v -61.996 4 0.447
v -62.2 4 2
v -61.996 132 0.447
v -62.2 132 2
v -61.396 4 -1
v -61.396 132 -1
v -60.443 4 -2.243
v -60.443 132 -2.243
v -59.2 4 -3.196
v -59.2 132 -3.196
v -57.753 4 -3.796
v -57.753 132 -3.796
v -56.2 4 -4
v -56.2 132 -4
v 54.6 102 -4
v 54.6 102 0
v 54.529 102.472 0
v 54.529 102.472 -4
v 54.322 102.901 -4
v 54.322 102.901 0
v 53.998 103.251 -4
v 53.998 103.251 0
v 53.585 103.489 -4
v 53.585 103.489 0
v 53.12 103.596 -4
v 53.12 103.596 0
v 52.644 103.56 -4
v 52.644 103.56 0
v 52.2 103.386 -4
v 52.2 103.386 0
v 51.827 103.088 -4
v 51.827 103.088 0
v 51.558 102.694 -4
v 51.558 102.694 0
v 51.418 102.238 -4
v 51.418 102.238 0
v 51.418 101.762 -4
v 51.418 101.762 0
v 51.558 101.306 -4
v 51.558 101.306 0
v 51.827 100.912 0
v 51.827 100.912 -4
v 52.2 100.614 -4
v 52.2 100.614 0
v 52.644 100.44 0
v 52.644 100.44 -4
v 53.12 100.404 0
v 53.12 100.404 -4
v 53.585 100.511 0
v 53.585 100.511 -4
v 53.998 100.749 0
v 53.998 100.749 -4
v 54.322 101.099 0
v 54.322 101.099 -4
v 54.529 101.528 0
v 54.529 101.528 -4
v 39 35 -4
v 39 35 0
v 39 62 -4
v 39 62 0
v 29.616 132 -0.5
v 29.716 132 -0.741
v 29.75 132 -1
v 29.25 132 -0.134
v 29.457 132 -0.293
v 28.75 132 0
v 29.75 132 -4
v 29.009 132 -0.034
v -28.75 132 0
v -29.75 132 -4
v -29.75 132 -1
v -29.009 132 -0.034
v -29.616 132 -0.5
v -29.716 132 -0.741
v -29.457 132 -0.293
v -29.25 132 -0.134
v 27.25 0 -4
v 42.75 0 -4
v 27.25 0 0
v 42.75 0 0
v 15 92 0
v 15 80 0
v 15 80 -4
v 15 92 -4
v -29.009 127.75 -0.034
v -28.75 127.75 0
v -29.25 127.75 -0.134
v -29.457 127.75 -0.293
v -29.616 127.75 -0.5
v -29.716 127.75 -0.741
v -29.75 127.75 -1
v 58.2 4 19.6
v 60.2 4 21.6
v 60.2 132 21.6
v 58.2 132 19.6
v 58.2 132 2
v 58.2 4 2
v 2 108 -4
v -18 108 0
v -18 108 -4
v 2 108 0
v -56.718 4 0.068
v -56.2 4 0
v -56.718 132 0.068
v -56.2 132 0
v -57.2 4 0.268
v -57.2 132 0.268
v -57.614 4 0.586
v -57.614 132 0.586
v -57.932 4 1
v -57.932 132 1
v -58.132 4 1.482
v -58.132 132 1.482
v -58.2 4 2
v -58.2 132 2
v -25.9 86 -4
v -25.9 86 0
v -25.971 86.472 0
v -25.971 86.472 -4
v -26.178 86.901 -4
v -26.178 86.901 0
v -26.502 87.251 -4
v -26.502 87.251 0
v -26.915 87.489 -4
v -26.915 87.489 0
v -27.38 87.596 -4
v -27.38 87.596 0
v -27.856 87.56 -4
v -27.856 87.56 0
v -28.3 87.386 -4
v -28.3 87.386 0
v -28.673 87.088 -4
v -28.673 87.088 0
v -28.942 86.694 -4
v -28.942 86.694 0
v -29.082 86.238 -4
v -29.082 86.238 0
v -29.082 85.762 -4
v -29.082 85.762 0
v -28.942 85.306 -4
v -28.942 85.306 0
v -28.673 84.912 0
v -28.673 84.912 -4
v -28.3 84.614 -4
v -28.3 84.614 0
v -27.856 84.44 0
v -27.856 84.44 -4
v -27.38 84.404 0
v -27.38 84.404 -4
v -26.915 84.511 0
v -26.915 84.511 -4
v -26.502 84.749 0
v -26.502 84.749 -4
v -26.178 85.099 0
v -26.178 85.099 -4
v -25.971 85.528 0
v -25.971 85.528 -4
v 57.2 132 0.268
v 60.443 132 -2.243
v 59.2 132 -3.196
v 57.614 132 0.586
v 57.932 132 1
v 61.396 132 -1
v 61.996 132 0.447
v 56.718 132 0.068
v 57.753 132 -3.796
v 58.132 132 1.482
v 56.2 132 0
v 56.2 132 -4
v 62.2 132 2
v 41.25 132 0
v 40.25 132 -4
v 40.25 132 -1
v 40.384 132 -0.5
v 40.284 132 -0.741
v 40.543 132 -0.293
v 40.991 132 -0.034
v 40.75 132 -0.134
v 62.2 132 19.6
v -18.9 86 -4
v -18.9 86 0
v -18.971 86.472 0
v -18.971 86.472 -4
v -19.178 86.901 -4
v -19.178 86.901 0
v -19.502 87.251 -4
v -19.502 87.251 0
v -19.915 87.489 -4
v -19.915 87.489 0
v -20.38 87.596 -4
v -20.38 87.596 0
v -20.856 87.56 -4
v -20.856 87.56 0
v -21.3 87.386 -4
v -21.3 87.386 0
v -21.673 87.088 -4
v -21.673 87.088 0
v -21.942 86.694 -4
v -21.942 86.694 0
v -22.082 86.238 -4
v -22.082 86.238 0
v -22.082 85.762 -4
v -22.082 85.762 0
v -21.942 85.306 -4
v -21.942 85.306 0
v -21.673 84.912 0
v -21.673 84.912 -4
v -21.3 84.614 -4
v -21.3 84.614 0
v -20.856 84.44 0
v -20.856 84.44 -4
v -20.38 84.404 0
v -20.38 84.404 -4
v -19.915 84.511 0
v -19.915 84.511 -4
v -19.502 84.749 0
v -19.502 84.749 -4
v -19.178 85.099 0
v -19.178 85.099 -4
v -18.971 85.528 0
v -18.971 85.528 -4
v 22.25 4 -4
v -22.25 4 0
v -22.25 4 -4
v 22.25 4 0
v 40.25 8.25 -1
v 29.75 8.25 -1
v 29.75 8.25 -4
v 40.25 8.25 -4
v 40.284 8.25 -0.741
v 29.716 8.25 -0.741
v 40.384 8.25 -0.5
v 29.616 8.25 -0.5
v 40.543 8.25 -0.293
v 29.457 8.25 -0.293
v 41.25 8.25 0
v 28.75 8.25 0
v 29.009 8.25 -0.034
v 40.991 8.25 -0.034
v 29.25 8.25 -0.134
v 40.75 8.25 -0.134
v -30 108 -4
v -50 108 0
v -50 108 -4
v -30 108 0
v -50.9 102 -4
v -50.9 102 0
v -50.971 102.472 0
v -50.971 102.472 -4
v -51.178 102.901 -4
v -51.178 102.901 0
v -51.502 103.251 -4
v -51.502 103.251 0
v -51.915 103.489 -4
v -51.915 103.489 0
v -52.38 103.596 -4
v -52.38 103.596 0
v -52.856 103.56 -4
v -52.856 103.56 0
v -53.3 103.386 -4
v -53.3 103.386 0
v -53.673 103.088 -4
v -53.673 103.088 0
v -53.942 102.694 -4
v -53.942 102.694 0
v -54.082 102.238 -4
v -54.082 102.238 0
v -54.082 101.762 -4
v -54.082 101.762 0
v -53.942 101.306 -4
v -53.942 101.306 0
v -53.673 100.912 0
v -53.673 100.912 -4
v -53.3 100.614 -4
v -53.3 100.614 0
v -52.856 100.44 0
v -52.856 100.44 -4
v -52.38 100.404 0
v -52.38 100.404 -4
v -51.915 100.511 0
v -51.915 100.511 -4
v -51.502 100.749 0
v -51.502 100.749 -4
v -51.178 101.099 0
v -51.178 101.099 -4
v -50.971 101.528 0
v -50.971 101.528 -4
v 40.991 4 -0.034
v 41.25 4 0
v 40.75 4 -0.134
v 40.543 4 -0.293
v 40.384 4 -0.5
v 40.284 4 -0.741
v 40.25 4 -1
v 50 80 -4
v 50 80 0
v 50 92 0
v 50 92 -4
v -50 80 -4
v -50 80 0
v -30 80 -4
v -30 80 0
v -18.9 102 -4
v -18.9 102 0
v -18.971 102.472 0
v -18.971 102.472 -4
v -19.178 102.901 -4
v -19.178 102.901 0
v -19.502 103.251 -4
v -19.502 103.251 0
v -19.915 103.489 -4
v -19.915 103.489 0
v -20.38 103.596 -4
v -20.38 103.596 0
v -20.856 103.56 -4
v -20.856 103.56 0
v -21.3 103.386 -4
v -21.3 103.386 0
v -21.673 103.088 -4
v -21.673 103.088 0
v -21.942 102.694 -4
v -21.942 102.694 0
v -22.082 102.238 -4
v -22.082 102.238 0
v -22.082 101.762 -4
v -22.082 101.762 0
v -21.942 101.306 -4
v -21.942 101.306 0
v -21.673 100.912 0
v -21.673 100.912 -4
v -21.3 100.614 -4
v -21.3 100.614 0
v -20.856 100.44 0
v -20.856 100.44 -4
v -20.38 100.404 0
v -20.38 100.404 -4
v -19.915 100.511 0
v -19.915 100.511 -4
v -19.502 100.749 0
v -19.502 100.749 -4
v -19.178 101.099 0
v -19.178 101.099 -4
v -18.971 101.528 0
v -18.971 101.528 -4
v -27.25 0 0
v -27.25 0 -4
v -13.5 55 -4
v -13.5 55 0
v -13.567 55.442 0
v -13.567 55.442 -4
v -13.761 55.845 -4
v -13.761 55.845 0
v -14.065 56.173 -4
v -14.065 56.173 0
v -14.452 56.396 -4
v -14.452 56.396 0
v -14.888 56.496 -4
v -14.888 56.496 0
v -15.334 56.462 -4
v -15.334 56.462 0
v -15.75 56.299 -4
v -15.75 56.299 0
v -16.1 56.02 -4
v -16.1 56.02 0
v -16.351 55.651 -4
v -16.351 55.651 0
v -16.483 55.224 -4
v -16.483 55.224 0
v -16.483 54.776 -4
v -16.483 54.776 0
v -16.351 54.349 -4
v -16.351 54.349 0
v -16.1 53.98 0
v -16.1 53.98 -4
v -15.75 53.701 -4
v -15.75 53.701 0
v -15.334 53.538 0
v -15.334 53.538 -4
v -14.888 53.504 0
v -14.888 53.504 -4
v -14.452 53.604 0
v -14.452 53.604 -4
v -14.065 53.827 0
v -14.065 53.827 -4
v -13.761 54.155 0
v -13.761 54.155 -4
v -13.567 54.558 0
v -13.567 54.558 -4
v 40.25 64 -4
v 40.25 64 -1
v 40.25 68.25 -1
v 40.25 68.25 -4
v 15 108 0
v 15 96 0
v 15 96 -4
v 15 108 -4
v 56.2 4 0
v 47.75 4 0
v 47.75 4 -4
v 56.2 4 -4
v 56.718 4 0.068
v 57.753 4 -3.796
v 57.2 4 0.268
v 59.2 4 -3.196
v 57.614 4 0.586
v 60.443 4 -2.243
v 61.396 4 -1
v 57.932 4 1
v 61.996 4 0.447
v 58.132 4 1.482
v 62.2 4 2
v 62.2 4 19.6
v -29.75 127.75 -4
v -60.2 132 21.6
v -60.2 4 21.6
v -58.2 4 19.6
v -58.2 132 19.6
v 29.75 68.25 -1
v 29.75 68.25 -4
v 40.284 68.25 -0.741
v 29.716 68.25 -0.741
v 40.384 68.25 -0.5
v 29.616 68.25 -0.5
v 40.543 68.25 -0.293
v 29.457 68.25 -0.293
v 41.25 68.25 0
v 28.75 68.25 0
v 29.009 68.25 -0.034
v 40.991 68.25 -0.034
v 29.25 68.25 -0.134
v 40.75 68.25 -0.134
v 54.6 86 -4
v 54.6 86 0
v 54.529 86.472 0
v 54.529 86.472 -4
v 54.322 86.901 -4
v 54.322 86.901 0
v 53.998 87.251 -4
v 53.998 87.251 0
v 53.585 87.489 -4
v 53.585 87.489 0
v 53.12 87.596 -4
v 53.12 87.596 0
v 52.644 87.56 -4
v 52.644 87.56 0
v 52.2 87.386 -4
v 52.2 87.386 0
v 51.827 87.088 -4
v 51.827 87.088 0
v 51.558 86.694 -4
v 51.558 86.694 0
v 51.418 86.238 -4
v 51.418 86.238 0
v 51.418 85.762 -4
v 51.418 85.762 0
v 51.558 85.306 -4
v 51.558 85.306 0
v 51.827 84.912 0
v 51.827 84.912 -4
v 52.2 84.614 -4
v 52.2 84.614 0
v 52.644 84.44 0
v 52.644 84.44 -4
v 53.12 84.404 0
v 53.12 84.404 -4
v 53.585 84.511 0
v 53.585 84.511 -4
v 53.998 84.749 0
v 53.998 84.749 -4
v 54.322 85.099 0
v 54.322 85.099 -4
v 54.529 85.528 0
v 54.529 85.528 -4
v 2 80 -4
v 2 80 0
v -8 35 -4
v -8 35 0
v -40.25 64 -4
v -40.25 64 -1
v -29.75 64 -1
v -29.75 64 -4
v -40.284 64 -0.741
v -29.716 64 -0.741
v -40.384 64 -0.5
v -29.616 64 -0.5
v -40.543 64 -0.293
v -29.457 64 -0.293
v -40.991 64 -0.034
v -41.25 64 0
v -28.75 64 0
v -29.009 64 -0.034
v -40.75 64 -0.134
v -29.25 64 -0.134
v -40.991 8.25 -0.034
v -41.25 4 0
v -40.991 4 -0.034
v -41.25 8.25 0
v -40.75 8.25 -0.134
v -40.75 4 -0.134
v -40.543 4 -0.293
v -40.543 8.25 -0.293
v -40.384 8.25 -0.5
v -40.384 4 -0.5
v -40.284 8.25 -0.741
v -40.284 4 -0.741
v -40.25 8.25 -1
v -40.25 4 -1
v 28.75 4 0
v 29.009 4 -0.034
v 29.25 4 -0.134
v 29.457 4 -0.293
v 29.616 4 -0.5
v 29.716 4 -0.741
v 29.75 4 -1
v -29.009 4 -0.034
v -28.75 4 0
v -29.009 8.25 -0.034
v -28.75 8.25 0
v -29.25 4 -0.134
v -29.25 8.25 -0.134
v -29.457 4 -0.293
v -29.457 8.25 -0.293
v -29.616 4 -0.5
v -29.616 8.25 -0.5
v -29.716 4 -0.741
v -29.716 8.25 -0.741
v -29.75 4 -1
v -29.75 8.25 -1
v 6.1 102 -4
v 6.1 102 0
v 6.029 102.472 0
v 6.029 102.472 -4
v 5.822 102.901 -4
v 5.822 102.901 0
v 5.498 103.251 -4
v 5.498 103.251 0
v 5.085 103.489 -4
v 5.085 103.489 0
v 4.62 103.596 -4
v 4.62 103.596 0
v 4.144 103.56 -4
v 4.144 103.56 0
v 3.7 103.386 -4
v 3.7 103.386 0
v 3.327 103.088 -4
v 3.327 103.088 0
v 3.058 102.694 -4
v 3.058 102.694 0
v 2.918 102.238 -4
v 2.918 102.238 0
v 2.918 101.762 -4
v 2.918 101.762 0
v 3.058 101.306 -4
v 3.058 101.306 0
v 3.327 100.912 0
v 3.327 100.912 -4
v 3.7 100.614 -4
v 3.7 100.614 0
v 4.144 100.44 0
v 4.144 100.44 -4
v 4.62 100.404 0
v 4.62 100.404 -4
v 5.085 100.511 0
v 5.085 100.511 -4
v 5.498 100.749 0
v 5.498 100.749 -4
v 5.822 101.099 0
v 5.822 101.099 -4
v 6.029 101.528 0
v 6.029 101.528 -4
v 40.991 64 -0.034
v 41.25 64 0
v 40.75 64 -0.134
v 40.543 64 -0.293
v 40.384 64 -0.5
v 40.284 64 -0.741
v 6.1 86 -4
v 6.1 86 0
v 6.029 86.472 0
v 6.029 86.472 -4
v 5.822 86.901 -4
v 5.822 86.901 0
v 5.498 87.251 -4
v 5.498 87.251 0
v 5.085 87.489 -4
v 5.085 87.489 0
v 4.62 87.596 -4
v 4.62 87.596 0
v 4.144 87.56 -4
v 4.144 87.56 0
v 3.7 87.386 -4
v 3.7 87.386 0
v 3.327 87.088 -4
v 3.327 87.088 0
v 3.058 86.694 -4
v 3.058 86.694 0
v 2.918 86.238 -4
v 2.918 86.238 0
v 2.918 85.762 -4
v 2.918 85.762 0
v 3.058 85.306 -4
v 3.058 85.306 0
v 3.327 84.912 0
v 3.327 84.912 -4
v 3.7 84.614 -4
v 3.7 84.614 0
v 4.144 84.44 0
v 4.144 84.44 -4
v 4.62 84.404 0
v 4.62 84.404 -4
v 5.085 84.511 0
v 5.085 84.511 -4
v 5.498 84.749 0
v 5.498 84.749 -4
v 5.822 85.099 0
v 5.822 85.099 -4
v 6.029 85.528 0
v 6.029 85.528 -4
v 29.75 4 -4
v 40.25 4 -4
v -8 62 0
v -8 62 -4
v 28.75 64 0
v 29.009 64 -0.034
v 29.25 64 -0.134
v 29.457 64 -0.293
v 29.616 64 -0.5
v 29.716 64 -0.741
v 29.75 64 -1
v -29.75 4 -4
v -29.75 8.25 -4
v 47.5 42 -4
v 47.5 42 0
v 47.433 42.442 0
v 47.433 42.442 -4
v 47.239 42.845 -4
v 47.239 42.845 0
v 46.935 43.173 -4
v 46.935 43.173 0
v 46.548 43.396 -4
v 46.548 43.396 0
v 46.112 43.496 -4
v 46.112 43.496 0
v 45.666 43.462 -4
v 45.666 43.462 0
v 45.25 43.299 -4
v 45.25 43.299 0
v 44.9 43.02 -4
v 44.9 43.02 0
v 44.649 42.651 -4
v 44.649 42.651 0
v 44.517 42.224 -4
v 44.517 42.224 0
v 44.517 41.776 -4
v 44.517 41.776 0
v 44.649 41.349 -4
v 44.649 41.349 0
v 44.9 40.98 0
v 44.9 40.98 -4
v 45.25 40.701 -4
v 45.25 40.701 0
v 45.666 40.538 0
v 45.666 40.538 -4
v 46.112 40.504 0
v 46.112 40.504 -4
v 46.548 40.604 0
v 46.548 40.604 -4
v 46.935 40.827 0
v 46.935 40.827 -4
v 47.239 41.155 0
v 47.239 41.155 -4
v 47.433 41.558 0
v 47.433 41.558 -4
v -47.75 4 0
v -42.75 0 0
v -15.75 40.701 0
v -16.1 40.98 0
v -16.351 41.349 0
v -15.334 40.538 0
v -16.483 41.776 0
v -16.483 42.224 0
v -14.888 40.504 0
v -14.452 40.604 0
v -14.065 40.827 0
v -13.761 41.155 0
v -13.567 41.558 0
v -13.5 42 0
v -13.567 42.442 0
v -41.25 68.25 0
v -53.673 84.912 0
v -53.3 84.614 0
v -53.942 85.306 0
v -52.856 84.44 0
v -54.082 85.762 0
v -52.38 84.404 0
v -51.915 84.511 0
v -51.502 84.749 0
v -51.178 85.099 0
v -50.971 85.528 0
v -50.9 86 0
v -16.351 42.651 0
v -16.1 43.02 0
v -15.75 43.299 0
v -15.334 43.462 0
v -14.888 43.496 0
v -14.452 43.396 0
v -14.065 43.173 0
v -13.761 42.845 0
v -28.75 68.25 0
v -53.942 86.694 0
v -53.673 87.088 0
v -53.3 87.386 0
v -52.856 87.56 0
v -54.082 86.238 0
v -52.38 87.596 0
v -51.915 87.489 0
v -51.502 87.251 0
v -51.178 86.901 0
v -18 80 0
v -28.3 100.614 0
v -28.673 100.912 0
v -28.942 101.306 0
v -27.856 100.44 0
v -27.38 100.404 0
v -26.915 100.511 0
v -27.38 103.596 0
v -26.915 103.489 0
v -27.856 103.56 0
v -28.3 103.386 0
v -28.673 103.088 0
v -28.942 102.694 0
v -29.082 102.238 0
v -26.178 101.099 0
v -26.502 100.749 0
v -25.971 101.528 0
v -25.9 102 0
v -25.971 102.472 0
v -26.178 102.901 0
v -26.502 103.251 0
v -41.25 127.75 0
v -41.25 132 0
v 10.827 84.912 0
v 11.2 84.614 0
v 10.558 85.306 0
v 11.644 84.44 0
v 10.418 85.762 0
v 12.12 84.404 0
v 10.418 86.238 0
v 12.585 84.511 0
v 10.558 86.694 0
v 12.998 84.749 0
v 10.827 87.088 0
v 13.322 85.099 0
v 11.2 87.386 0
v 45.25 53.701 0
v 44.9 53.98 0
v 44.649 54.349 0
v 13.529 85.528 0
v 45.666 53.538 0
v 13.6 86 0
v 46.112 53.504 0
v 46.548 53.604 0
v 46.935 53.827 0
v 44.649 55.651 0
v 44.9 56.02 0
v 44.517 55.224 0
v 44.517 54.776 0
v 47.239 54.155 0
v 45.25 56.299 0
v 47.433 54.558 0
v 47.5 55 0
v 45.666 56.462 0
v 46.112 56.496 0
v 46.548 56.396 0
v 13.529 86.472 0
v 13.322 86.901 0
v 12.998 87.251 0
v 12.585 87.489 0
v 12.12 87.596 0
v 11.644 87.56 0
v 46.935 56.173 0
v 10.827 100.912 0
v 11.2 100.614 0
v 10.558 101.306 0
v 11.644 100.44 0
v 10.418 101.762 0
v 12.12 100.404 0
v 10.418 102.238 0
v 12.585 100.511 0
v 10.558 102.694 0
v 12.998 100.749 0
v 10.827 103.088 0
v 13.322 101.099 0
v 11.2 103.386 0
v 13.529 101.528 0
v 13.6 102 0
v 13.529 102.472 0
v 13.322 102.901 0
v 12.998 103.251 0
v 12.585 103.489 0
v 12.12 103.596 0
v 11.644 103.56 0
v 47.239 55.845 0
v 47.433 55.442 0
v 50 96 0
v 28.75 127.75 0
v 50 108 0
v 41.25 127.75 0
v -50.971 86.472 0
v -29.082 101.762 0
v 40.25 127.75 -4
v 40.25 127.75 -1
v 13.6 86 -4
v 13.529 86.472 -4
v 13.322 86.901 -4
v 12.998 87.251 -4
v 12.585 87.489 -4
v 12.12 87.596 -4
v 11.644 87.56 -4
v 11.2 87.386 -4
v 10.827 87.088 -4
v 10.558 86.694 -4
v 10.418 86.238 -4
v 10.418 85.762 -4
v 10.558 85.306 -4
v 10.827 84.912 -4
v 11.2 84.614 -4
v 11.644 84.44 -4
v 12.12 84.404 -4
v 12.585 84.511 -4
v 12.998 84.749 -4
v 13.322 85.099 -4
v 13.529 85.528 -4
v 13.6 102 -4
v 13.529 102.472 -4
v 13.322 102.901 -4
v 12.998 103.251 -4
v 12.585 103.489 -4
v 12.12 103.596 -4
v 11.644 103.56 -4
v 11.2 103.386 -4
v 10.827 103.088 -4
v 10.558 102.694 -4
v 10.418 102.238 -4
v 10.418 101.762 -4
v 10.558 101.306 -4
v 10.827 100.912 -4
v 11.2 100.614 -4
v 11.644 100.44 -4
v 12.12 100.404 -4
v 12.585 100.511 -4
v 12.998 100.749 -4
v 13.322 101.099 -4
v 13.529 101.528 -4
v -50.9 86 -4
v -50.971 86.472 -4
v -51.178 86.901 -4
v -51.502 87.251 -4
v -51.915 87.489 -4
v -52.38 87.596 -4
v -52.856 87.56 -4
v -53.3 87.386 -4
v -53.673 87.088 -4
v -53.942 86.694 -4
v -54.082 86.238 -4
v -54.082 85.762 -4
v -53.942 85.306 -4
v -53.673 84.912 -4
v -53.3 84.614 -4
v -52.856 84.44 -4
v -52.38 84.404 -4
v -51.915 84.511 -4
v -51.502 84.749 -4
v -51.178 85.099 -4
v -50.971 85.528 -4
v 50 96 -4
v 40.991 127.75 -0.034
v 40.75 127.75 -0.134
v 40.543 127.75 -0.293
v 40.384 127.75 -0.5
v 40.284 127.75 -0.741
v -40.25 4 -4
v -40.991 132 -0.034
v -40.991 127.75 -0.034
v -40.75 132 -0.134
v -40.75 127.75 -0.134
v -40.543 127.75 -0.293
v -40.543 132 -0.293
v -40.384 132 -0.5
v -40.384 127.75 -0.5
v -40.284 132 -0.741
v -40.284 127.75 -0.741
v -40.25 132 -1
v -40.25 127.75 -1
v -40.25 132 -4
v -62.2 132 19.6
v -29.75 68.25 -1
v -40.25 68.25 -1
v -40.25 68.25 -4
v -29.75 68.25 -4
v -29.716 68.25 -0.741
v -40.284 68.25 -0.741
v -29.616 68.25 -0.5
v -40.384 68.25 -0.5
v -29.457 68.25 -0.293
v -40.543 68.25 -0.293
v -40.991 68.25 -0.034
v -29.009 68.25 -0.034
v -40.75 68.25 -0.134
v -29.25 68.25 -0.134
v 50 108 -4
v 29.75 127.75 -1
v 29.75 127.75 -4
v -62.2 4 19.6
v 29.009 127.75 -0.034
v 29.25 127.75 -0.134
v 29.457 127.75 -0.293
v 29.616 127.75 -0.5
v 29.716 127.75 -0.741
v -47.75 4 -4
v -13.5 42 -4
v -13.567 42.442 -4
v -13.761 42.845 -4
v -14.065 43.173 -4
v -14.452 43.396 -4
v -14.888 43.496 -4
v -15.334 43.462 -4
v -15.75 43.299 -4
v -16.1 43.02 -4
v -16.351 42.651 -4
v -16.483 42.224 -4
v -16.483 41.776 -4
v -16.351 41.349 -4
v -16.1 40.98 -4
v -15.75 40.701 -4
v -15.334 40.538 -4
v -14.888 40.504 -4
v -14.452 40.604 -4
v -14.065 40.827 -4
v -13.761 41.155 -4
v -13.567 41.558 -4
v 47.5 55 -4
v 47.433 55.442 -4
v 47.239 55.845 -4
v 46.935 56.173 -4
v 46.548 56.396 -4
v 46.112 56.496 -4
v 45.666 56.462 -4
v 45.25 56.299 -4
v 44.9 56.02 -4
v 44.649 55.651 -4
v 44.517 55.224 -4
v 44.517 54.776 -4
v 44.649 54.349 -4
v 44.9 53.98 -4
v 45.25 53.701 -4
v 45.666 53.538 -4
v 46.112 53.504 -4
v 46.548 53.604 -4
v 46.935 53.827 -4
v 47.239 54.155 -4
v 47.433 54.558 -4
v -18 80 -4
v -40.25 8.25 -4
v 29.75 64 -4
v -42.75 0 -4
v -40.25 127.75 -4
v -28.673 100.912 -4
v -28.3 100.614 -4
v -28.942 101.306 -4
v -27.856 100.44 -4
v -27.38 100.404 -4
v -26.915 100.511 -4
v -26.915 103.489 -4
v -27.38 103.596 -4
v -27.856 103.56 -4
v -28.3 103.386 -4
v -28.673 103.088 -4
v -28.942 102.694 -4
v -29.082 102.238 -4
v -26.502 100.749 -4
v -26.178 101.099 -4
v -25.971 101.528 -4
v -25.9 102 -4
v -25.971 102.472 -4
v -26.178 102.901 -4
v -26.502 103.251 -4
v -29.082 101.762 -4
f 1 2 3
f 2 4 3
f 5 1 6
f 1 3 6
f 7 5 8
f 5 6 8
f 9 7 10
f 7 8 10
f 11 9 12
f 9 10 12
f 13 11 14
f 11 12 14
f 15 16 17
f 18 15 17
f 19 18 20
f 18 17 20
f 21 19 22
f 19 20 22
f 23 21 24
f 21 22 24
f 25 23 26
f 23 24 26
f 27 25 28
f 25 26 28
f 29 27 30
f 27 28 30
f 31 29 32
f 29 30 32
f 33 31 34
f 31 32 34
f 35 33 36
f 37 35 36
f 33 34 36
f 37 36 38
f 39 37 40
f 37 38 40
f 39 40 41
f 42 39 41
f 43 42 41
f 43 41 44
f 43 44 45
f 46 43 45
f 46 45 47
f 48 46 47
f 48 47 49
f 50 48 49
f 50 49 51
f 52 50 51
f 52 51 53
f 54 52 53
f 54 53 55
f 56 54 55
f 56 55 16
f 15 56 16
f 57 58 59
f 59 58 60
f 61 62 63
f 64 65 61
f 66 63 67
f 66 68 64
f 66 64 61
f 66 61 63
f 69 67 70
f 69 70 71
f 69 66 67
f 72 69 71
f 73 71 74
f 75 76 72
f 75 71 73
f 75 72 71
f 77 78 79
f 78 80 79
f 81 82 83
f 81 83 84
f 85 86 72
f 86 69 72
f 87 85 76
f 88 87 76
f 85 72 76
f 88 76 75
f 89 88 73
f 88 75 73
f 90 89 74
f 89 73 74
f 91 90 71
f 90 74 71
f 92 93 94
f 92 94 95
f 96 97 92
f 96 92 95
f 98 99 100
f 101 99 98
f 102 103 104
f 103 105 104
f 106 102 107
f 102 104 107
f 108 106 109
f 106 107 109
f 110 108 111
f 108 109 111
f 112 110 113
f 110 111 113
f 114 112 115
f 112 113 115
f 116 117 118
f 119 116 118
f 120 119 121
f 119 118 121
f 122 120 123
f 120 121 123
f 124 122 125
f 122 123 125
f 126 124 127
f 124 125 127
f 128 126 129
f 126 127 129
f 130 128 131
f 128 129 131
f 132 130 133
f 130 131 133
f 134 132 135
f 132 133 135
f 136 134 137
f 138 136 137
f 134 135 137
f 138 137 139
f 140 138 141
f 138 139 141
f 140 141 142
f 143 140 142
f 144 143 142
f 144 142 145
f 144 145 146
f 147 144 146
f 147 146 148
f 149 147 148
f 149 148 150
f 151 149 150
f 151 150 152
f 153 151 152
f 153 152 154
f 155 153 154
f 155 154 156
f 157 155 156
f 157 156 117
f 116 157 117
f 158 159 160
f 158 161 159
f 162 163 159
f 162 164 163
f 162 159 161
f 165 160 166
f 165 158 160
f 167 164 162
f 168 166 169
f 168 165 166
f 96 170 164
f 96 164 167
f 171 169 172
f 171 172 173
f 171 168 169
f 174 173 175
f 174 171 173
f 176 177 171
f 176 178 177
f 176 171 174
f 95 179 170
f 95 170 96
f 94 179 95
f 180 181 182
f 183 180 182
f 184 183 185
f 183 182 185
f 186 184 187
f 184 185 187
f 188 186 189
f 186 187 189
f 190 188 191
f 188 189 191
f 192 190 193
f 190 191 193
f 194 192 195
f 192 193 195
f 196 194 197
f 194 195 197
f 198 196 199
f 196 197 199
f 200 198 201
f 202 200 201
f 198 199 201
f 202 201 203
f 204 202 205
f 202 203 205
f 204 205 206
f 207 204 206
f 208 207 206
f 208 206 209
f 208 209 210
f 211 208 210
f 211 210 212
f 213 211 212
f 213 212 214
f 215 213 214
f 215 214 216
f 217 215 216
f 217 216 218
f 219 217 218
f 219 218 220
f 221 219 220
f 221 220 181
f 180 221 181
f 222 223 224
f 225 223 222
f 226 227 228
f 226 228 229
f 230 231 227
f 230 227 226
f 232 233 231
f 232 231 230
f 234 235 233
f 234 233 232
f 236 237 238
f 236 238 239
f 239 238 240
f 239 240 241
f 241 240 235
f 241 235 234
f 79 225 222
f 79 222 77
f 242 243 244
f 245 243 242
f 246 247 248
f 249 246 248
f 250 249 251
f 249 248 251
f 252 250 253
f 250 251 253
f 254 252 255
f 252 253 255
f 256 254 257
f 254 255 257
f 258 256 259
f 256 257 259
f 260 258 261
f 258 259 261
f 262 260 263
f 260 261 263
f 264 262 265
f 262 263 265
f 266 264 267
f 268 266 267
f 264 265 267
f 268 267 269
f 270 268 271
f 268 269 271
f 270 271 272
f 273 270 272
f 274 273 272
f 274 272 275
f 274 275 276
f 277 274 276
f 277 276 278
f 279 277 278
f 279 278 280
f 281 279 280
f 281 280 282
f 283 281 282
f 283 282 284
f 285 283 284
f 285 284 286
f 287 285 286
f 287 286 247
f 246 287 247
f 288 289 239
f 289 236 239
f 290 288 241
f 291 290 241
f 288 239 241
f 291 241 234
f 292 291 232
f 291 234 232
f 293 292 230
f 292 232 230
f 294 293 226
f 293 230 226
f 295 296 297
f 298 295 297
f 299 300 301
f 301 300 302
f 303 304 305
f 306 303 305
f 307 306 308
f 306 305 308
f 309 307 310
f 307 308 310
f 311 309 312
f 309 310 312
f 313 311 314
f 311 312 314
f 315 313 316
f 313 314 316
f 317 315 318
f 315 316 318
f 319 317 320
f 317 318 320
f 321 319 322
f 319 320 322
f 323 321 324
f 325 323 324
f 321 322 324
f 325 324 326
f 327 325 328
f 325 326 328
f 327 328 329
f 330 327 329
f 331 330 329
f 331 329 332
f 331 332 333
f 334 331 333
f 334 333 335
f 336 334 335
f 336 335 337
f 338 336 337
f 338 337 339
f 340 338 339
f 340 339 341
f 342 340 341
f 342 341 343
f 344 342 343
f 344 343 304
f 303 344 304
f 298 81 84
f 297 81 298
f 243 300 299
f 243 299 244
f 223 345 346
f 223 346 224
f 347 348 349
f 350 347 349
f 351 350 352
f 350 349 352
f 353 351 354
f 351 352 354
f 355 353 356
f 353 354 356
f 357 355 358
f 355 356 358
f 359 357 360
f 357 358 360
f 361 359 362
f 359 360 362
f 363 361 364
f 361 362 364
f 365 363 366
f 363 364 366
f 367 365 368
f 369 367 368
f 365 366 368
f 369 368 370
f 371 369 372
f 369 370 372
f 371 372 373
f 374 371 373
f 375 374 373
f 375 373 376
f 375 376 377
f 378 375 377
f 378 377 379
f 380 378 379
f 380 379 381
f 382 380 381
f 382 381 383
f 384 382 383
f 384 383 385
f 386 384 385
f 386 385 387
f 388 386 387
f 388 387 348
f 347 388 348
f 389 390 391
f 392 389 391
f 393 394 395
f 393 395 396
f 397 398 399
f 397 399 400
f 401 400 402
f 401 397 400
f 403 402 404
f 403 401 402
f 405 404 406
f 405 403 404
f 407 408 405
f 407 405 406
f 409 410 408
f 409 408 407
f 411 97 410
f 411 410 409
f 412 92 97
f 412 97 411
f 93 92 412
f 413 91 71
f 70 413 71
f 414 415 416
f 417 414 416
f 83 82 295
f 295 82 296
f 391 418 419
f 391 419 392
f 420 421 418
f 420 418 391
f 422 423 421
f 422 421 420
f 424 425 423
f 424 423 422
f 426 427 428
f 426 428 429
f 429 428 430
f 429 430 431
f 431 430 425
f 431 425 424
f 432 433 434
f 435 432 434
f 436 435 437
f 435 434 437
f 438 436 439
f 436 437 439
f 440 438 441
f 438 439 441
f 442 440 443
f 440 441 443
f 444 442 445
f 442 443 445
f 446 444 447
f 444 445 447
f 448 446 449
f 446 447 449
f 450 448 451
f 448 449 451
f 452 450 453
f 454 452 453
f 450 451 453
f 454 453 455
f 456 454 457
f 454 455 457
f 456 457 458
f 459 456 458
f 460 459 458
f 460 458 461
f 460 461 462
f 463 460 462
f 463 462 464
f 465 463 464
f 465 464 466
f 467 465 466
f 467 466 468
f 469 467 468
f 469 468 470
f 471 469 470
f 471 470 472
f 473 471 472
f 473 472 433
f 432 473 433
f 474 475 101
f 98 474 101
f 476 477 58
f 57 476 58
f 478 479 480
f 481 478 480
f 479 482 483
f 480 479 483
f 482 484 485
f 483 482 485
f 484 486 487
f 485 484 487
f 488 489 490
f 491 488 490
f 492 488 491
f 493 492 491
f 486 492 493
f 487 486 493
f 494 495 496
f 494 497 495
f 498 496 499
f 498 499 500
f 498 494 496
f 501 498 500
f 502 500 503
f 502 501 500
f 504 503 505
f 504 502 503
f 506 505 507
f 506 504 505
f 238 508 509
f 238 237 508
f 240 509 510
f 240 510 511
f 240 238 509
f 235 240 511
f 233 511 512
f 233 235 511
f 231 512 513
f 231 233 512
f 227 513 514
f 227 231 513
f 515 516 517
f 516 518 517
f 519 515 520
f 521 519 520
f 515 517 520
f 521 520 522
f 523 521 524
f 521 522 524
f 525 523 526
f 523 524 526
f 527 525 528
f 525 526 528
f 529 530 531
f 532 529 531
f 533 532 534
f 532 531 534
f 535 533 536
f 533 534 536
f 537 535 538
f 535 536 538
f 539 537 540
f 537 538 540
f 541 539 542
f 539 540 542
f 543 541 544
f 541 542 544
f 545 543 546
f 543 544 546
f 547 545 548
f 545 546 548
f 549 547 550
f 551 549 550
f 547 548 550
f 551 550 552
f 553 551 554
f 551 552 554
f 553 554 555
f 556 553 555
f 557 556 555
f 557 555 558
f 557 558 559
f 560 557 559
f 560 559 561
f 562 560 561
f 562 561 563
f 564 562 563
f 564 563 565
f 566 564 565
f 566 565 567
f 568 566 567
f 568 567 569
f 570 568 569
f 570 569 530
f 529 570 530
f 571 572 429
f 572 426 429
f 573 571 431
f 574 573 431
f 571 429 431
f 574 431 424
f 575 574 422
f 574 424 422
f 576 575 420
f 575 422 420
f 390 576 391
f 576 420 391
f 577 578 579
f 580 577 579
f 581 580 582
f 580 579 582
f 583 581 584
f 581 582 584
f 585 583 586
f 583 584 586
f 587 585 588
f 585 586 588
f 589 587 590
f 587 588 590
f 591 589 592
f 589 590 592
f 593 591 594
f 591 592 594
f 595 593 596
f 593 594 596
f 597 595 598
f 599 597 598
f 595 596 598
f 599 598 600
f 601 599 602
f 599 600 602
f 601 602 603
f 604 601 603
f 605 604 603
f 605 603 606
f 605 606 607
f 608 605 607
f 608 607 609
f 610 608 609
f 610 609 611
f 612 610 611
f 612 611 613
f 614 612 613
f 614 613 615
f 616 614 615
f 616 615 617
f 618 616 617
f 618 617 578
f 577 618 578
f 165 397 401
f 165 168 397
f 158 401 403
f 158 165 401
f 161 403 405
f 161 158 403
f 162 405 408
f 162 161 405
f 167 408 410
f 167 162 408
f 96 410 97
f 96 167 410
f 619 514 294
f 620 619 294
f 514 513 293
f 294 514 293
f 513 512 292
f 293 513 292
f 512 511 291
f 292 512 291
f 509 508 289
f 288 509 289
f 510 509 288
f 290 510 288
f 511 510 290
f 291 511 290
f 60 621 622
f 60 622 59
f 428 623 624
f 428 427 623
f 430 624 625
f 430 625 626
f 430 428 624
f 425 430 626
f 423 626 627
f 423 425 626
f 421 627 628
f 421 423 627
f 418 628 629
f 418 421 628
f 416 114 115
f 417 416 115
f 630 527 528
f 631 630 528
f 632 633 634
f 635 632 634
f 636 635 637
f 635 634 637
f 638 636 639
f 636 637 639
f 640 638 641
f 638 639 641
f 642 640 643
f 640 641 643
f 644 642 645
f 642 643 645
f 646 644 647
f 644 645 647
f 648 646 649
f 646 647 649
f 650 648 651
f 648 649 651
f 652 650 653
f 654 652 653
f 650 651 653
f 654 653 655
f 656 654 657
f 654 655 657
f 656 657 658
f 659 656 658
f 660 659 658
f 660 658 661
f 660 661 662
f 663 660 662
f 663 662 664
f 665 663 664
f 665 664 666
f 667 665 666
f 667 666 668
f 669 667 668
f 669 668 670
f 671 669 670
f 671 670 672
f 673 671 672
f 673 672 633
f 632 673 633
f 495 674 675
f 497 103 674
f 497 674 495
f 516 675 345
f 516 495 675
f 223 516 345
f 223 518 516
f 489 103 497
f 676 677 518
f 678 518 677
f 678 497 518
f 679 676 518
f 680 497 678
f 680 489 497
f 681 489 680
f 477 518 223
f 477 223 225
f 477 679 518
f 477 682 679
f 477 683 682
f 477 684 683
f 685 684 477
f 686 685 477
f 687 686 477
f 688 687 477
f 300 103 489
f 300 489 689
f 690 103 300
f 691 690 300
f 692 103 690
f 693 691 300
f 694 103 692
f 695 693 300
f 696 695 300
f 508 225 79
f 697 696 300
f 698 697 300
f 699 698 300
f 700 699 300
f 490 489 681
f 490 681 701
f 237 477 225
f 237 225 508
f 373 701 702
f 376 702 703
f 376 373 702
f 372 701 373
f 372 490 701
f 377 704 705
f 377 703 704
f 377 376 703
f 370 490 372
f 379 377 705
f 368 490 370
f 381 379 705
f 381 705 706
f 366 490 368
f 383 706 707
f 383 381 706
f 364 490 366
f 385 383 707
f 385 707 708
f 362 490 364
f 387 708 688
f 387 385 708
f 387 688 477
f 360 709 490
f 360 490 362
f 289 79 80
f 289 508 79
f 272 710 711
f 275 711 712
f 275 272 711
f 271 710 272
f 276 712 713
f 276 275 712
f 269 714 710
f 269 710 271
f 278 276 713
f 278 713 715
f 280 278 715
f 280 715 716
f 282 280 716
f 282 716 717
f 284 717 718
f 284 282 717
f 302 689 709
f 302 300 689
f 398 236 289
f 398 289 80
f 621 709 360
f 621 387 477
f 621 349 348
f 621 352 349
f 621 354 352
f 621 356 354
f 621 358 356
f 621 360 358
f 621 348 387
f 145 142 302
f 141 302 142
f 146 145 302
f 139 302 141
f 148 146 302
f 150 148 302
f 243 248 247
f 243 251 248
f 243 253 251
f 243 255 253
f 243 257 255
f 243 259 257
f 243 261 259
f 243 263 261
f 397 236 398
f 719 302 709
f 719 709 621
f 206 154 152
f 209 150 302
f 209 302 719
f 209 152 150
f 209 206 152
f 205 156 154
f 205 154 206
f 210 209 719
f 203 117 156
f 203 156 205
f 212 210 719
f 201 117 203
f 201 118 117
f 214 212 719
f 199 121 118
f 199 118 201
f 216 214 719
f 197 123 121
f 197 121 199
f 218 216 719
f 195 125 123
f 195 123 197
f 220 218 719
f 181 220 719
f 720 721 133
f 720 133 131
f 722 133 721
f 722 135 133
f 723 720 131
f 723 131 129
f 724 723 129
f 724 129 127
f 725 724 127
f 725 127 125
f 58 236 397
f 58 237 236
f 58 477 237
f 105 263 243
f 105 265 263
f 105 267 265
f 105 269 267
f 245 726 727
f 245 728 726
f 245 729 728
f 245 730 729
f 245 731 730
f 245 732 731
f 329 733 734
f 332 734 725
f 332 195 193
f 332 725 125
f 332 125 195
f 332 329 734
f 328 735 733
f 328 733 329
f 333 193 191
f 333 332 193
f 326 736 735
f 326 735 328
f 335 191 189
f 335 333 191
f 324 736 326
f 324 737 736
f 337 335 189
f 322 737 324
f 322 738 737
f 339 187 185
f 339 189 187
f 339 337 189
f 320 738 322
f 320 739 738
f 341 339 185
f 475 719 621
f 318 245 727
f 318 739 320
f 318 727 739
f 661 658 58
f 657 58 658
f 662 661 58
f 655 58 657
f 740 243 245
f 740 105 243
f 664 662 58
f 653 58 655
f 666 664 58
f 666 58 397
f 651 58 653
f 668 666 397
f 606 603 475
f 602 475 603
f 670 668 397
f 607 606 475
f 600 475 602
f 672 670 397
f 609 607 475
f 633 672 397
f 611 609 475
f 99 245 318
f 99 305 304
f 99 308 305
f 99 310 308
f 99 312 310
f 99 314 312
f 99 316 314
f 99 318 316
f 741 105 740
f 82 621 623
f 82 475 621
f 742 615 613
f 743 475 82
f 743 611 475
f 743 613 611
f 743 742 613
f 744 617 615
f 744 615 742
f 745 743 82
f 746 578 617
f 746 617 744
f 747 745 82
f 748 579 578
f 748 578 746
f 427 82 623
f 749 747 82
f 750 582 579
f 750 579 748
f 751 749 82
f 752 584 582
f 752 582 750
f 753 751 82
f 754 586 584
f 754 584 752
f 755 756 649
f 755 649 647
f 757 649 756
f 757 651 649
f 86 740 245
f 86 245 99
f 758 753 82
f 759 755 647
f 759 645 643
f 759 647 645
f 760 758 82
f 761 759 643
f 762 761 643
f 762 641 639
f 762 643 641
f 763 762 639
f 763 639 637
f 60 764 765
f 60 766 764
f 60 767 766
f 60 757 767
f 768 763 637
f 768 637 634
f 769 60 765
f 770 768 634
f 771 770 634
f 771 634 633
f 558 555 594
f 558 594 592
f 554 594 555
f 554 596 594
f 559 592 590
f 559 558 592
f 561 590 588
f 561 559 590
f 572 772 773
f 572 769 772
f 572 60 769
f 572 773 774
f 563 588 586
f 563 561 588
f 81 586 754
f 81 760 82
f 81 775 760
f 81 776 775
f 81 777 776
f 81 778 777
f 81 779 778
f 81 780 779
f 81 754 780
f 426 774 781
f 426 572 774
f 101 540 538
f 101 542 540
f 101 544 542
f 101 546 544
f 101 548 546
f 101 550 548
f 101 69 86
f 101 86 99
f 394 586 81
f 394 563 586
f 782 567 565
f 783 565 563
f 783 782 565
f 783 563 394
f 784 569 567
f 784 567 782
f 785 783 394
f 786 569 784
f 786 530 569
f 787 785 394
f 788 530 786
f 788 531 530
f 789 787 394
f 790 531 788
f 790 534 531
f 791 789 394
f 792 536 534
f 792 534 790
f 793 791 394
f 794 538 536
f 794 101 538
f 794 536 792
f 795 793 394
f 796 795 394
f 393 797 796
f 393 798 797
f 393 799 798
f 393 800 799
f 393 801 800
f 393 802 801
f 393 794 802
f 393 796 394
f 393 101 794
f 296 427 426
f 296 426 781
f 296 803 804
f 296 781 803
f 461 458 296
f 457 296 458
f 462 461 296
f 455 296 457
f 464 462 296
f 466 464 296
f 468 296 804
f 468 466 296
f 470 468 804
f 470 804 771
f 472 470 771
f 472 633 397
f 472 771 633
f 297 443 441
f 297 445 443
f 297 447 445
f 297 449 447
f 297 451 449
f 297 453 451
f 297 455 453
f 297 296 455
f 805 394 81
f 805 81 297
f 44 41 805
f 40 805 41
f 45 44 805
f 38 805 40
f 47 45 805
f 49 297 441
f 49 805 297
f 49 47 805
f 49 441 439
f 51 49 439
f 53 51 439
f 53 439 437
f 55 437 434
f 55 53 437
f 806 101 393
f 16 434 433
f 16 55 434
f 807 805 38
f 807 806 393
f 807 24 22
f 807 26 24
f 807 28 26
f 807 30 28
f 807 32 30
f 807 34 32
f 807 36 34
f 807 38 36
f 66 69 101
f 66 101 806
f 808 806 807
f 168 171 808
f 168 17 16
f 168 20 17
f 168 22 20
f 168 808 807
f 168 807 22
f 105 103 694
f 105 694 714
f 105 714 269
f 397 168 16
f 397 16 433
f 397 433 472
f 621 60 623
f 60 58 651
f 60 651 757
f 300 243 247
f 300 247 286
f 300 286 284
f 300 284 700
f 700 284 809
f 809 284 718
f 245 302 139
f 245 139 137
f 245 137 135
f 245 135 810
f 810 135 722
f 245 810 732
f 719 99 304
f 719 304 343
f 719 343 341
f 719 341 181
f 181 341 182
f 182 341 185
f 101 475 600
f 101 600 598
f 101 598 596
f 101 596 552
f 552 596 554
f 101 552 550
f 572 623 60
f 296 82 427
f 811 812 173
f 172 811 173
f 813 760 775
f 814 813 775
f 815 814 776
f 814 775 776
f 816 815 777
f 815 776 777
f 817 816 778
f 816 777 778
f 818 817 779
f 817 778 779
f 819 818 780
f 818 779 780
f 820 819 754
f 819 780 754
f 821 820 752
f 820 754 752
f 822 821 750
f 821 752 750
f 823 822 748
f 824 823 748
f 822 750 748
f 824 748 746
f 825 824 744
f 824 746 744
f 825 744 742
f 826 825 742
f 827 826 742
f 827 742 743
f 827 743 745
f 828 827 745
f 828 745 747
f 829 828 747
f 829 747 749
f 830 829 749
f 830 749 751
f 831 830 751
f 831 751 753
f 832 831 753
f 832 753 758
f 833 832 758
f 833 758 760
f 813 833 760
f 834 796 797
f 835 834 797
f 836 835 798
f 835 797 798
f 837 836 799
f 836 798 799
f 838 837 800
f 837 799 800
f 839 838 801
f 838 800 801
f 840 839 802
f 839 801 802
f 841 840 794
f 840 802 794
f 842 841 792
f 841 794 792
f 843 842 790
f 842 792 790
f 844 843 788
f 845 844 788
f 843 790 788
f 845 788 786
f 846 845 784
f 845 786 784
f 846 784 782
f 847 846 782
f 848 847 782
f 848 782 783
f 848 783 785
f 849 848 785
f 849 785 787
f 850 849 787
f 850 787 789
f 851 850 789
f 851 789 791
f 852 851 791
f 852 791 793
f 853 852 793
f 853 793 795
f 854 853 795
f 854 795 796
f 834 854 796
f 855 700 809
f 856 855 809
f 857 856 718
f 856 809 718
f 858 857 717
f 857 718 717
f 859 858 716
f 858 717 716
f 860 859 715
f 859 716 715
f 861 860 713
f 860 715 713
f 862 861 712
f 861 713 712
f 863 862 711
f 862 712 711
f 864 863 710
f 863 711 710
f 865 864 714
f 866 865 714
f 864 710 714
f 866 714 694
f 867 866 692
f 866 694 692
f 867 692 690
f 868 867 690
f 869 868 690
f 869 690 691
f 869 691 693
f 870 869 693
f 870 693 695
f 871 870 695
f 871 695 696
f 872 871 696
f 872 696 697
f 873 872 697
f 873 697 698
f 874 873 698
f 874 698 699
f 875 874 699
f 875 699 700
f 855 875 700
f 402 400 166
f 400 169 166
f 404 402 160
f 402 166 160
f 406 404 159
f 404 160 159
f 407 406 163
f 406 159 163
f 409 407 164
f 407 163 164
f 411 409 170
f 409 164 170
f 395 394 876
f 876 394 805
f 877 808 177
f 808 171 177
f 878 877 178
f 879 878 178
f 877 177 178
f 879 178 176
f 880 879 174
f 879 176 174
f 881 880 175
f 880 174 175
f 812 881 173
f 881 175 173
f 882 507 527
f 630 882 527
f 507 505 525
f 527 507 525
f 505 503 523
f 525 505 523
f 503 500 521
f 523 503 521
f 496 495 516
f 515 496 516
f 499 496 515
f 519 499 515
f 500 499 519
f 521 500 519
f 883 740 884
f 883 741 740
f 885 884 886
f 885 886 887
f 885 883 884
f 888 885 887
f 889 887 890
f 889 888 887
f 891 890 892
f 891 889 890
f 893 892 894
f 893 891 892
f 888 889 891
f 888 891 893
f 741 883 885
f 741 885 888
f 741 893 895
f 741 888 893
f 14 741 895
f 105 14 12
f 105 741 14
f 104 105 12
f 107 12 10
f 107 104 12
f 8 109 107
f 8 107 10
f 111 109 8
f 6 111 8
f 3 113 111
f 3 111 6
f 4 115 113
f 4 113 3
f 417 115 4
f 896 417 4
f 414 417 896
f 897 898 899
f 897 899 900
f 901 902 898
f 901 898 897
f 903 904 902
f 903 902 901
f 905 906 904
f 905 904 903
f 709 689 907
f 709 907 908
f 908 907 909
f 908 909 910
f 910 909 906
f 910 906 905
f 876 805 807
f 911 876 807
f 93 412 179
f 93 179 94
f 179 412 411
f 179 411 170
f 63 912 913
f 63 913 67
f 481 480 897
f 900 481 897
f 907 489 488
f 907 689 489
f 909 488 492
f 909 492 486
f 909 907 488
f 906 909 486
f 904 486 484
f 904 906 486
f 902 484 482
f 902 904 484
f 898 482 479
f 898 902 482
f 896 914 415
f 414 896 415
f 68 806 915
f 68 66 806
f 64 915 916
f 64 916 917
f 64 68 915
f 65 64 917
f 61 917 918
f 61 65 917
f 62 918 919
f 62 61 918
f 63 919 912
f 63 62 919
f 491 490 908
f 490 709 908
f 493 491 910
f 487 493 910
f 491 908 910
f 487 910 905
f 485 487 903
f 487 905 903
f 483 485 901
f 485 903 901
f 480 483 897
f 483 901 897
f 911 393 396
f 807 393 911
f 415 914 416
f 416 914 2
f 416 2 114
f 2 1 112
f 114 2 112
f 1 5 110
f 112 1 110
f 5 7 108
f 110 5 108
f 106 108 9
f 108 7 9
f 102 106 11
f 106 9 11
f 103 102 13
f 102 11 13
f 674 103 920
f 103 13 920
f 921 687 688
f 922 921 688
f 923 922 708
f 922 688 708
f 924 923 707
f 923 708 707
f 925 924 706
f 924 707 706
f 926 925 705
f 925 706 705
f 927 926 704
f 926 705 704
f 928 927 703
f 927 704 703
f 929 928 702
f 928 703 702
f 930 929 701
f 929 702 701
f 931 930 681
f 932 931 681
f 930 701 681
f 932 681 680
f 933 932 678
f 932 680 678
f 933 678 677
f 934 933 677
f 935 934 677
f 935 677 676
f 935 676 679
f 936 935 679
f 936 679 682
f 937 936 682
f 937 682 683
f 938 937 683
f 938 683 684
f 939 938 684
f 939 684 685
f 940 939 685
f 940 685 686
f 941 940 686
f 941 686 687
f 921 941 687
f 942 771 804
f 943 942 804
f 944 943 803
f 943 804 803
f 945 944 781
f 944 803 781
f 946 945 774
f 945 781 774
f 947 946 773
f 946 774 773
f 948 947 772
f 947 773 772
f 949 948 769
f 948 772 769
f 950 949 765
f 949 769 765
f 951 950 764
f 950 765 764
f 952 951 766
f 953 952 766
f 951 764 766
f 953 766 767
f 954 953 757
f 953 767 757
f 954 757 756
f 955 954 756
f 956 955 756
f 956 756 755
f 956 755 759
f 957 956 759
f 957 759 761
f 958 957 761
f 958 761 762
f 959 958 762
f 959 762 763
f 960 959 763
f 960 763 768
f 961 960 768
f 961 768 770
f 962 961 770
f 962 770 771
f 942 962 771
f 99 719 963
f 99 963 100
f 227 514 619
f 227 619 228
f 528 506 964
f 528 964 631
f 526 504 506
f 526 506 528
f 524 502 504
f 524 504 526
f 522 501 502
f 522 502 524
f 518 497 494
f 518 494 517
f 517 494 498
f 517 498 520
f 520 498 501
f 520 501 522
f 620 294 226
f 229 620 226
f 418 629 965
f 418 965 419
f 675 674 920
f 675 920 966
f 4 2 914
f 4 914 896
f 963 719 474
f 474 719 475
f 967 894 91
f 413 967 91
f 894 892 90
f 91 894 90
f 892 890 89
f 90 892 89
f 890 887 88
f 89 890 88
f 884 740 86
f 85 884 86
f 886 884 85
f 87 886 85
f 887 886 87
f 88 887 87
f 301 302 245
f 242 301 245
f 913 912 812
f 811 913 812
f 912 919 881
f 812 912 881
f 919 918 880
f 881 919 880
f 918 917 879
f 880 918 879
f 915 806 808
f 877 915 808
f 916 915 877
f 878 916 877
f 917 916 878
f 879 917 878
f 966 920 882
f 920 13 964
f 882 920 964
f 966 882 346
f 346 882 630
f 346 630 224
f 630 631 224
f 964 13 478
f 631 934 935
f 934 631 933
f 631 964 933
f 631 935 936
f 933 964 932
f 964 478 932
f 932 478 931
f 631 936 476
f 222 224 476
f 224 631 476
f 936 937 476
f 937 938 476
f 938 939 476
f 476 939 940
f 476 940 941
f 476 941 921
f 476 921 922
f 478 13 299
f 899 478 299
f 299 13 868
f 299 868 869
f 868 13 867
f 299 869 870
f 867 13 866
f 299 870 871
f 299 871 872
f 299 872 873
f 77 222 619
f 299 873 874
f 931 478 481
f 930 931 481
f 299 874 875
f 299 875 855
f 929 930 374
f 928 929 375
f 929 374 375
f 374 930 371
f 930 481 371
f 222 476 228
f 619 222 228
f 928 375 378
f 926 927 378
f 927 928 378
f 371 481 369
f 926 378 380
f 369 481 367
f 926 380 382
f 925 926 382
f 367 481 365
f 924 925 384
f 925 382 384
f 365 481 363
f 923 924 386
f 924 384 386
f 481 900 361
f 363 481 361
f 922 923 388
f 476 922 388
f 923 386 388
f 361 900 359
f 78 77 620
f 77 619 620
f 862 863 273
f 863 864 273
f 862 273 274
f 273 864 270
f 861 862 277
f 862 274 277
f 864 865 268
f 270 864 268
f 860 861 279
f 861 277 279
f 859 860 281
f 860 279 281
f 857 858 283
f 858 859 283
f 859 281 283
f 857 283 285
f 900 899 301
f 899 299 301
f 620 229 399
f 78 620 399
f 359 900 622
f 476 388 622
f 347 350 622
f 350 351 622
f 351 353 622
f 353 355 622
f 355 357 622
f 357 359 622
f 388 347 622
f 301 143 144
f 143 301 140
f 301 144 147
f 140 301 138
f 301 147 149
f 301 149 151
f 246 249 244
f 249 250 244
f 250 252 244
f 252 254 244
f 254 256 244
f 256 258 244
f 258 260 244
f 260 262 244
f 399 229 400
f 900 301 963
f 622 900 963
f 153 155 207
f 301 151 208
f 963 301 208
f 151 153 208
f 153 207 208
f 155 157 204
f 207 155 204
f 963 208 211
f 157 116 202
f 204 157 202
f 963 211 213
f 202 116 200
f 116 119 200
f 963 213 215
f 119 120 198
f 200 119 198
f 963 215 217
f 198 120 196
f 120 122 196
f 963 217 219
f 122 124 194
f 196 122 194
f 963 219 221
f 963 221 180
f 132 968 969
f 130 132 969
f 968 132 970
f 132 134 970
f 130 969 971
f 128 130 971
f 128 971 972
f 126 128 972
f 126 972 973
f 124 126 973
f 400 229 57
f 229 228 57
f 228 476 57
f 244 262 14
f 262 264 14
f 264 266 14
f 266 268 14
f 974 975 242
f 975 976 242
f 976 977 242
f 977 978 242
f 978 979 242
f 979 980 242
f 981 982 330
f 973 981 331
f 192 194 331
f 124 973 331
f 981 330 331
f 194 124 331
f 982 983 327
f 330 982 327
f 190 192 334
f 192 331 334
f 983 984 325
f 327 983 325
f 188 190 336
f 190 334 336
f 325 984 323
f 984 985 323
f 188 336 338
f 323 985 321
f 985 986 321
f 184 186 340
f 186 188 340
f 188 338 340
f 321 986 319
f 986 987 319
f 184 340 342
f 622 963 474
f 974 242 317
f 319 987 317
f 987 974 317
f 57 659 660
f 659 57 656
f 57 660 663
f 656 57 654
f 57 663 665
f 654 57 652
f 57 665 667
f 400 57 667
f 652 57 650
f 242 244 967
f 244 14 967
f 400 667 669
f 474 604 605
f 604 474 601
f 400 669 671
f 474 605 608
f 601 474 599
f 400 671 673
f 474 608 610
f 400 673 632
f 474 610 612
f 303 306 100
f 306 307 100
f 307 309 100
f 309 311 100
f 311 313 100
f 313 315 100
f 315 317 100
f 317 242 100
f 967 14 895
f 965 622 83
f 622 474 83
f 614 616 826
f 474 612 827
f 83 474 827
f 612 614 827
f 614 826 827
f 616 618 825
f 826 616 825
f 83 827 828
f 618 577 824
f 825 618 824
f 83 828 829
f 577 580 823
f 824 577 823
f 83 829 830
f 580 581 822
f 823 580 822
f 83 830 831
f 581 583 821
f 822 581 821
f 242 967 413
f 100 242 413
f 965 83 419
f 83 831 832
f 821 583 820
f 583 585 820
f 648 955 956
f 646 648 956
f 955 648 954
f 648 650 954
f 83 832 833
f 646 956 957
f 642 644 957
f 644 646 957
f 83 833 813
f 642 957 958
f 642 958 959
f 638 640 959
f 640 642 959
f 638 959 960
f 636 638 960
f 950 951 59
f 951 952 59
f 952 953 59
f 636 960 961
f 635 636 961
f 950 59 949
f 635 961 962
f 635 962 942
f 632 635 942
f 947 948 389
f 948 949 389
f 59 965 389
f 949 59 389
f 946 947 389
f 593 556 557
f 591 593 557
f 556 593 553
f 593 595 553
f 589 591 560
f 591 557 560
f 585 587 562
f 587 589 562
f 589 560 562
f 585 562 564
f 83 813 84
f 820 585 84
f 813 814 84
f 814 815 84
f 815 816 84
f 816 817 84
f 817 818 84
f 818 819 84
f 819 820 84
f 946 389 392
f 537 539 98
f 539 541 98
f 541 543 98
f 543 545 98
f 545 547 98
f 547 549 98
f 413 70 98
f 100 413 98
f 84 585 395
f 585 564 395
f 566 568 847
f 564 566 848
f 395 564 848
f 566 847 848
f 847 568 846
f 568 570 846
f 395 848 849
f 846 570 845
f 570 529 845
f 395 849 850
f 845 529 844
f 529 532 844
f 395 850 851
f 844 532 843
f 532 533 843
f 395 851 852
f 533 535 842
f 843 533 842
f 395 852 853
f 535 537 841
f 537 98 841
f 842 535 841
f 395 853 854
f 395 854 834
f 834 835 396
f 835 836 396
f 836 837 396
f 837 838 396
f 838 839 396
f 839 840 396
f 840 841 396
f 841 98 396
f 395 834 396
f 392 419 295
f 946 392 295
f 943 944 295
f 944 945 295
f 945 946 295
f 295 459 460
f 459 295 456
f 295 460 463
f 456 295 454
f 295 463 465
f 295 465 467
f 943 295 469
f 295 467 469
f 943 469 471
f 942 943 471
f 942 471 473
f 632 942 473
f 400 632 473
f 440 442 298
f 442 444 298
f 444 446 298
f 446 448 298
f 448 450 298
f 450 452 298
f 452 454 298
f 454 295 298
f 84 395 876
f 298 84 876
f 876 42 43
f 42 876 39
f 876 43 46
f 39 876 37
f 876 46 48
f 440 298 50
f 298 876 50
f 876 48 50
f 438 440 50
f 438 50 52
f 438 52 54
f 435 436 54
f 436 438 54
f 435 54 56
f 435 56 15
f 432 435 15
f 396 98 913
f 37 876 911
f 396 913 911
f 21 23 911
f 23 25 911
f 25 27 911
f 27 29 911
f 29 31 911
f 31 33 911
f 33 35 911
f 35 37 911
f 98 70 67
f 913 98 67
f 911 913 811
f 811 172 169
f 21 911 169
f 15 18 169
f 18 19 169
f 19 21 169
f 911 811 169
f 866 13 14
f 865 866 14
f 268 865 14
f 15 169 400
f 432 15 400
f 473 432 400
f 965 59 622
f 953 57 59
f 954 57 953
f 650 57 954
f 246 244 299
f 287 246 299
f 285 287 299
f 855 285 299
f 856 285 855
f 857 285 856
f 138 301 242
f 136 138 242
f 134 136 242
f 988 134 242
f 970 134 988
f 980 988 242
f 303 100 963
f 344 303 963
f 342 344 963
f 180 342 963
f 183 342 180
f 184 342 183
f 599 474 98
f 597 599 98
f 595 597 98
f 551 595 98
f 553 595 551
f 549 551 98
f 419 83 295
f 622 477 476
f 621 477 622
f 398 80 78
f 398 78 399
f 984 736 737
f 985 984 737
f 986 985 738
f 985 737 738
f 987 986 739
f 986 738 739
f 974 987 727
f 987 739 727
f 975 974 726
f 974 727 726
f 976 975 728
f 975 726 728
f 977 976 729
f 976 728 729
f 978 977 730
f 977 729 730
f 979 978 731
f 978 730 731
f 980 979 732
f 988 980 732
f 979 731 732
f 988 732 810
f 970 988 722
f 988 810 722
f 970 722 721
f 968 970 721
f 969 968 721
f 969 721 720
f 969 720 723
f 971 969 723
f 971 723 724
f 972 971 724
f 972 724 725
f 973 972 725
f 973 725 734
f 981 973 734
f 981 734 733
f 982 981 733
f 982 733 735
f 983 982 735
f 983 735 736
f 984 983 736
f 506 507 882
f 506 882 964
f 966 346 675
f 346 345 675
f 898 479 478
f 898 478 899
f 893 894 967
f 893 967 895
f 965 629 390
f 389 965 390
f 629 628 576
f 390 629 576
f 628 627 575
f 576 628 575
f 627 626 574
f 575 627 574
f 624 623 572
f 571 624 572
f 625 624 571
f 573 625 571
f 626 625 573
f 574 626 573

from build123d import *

# Parameters (mm, degrees)
SKETCH_W          = 124.4
SKETCH_H          = 132
PAD_DEPTH         = 4
SKETCH001_W       = 4
SKETCH001_H       = 132
PAD001_DEPTH      = 19.6
PAD002_DEPTH      = 132
SKETCH003_W       = 10.5
SKETCH003_H       = 4.25
POCKET_DEPTH      = 4.001
POCKET_DEPTH_BACK = 21.601
FILLET_R          = 6
FILLET001_R       = 2
FILLET002_R       = 1
SKETCH004_R       = 1.6
SKETCH004_R_2     = 1.5
SKETCH004_W       = 20
SKETCH004_H       = 28
SKETCH004_W_2     = 35
SKETCH004_H_2     = 12
SKETCH004_W_3     = 47
SKETCH004_H_3     = 27
POCKET001_DEPTH   = 4.001


with BuildPart() as part:
    # Sketch → Pad (new body)
    with BuildSketch(Plane.XY):
        with Locations((0, 66)):
            Rectangle(SKETCH_W, SKETCH_H)
    extrude(amount=-PAD_DEPTH)

    # Sketch001 → Pad001 (join)
    with BuildSketch(Plane.XY):
        with Locations((-60.2, 66)):
            Rectangle(SKETCH001_W, SKETCH001_H)
        with Locations((60.2, 66)):
            Rectangle(SKETCH001_W, SKETCH001_H)
    extrude(amount=PAD001_DEPTH)

    # Sketch002 → Pad002 (join)
    with BuildSketch(Plane.XZ):
        Polygon((-58.2, 19.6), (-62.2, 19.6), (-60.2, 21.6), align=None)
        Polygon((58.2, 19.6), (62.2, 19.6), (60.2, 21.6), align=None)
    extrude(amount=-PAD002_DEPTH)

    # Sketch003 → Pocket (cut, two sides)
    with BuildSketch(Plane.XY) as pocket_sk:
        with Locations((-35, 6.125)):
            Rectangle(SKETCH003_W, SKETCH003_H)
        with Locations((-35, 66.125)):
            Rectangle(SKETCH003_W, SKETCH003_H)
        with Locations((-35, 129.875)):
            Rectangle(SKETCH003_W, SKETCH003_H)
        with Locations((35, 6.125)):
            Rectangle(SKETCH003_W, SKETCH003_H)
        with Locations((35, 66.125)):
            Rectangle(SKETCH003_W, SKETCH003_H)
        with Locations((35, 129.875)):
            Rectangle(SKETCH003_W, SKETCH003_H)
        Polygon((-42.75, 0), (-27.25, 0), (-22.25, 4), (22.25, 4), (27.25, 0), (42.75, 0), (47.75, 4), (90, 4), (90, -46), (-90, -46), (-90, 4), (-47.75, 4), align=None)
    extrude(amount=-POCKET_DEPTH, mode=Mode.SUBTRACT)
    extrude(pocket_sk.sketch, amount=POCKET_DEPTH_BACK, mode=Mode.SUBTRACT)

    # Fillet
    fillet_edges = [part.edges().sort_by_distance(p)[0] for p in [
        (-62.2, 68, -4),
        (62.2, 68, -4),
    ]]
    fillet(fillet_edges, radius=FILLET_R)

    # Fillet001
    fillet001_edges = [part.edges().sort_by_distance(p)[0] for p in [
        (-58.2, 68, 0),
        (58.2, 68, 0),
    ]]
    fillet(fillet001_edges, radius=FILLET001_R)

    # Fillet002
    fillet002_edges = [part.edges().sort_by_distance(p)[0] for p in [
        (-40.25, 129.875, 0),
        (-29.75, 129.875, 0),
        (29.75, 129.875, 0),
        (40.25, 129.875, 0),
        (29.75, 66.125, 0),
        (40.25, 66.125, 0),
        (29.75, 6.125, 0),
        (40.25, 6.125, 0),
        (-40.25, 6.125, 0),
        (-29.75, 6.125, 0),
        (-40.25, 66.125, 0),
        (-29.75, 66.125, 0),
    ]]
    fillet(fillet002_edges, radius=FILLET002_R)

    # Sketch004 → Pocket001 (cut, through all)
    with BuildSketch(Plane.XY):
        with Locations((-52.5, 102)):
            Circle(SKETCH004_R)
        with Locations((-27.5, 102)):
            Circle(SKETCH004_R)
        with Locations((-27.5, 86)):
            Circle(SKETCH004_R)
        with Locations((-52.5, 86)):
            Circle(SKETCH004_R)
        with Locations((-20.5, 102)):
            Circle(SKETCH004_R)
        with Locations((4.5, 102)):
            Circle(SKETCH004_R)
        with Locations((4.5, 86)):
            Circle(SKETCH004_R)
        with Locations((-20.5, 86)):
            Circle(SKETCH004_R)
        with Locations((12, 102)):
            Circle(SKETCH004_R)
        with Locations((53, 102)):
            Circle(SKETCH004_R)
        with Locations((12, 86)):
            Circle(SKETCH004_R)
        with Locations((53, 86)):
            Circle(SKETCH004_R)
        with Locations((46, 55)):
            Circle(SKETCH004_R_2)
        with Locations((46, 42)):
            Circle(SKETCH004_R_2)
        with Locations((-15, 55)):
            Circle(SKETCH004_R_2)
        with Locations((-15, 42)):
            Circle(SKETCH004_R_2)
        with Locations((-40, 94)):
            Rectangle(SKETCH004_W, SKETCH004_H)
        with Locations((-8, 94)):
            Rectangle(SKETCH004_W, SKETCH004_H)
        with Locations((32.5, 102)):
            Rectangle(SKETCH004_W_2, SKETCH004_H_2)
        with Locations((32.5, 86)):
            Rectangle(SKETCH004_W_2, SKETCH004_H_2)
        with Locations((15.5, 48.5)):
            Rectangle(SKETCH004_W_3, SKETCH004_H_3)
    extrude(amount=-POCKET001_DEPTH, mode=Mode.SUBTRACT)


solid = part.part
